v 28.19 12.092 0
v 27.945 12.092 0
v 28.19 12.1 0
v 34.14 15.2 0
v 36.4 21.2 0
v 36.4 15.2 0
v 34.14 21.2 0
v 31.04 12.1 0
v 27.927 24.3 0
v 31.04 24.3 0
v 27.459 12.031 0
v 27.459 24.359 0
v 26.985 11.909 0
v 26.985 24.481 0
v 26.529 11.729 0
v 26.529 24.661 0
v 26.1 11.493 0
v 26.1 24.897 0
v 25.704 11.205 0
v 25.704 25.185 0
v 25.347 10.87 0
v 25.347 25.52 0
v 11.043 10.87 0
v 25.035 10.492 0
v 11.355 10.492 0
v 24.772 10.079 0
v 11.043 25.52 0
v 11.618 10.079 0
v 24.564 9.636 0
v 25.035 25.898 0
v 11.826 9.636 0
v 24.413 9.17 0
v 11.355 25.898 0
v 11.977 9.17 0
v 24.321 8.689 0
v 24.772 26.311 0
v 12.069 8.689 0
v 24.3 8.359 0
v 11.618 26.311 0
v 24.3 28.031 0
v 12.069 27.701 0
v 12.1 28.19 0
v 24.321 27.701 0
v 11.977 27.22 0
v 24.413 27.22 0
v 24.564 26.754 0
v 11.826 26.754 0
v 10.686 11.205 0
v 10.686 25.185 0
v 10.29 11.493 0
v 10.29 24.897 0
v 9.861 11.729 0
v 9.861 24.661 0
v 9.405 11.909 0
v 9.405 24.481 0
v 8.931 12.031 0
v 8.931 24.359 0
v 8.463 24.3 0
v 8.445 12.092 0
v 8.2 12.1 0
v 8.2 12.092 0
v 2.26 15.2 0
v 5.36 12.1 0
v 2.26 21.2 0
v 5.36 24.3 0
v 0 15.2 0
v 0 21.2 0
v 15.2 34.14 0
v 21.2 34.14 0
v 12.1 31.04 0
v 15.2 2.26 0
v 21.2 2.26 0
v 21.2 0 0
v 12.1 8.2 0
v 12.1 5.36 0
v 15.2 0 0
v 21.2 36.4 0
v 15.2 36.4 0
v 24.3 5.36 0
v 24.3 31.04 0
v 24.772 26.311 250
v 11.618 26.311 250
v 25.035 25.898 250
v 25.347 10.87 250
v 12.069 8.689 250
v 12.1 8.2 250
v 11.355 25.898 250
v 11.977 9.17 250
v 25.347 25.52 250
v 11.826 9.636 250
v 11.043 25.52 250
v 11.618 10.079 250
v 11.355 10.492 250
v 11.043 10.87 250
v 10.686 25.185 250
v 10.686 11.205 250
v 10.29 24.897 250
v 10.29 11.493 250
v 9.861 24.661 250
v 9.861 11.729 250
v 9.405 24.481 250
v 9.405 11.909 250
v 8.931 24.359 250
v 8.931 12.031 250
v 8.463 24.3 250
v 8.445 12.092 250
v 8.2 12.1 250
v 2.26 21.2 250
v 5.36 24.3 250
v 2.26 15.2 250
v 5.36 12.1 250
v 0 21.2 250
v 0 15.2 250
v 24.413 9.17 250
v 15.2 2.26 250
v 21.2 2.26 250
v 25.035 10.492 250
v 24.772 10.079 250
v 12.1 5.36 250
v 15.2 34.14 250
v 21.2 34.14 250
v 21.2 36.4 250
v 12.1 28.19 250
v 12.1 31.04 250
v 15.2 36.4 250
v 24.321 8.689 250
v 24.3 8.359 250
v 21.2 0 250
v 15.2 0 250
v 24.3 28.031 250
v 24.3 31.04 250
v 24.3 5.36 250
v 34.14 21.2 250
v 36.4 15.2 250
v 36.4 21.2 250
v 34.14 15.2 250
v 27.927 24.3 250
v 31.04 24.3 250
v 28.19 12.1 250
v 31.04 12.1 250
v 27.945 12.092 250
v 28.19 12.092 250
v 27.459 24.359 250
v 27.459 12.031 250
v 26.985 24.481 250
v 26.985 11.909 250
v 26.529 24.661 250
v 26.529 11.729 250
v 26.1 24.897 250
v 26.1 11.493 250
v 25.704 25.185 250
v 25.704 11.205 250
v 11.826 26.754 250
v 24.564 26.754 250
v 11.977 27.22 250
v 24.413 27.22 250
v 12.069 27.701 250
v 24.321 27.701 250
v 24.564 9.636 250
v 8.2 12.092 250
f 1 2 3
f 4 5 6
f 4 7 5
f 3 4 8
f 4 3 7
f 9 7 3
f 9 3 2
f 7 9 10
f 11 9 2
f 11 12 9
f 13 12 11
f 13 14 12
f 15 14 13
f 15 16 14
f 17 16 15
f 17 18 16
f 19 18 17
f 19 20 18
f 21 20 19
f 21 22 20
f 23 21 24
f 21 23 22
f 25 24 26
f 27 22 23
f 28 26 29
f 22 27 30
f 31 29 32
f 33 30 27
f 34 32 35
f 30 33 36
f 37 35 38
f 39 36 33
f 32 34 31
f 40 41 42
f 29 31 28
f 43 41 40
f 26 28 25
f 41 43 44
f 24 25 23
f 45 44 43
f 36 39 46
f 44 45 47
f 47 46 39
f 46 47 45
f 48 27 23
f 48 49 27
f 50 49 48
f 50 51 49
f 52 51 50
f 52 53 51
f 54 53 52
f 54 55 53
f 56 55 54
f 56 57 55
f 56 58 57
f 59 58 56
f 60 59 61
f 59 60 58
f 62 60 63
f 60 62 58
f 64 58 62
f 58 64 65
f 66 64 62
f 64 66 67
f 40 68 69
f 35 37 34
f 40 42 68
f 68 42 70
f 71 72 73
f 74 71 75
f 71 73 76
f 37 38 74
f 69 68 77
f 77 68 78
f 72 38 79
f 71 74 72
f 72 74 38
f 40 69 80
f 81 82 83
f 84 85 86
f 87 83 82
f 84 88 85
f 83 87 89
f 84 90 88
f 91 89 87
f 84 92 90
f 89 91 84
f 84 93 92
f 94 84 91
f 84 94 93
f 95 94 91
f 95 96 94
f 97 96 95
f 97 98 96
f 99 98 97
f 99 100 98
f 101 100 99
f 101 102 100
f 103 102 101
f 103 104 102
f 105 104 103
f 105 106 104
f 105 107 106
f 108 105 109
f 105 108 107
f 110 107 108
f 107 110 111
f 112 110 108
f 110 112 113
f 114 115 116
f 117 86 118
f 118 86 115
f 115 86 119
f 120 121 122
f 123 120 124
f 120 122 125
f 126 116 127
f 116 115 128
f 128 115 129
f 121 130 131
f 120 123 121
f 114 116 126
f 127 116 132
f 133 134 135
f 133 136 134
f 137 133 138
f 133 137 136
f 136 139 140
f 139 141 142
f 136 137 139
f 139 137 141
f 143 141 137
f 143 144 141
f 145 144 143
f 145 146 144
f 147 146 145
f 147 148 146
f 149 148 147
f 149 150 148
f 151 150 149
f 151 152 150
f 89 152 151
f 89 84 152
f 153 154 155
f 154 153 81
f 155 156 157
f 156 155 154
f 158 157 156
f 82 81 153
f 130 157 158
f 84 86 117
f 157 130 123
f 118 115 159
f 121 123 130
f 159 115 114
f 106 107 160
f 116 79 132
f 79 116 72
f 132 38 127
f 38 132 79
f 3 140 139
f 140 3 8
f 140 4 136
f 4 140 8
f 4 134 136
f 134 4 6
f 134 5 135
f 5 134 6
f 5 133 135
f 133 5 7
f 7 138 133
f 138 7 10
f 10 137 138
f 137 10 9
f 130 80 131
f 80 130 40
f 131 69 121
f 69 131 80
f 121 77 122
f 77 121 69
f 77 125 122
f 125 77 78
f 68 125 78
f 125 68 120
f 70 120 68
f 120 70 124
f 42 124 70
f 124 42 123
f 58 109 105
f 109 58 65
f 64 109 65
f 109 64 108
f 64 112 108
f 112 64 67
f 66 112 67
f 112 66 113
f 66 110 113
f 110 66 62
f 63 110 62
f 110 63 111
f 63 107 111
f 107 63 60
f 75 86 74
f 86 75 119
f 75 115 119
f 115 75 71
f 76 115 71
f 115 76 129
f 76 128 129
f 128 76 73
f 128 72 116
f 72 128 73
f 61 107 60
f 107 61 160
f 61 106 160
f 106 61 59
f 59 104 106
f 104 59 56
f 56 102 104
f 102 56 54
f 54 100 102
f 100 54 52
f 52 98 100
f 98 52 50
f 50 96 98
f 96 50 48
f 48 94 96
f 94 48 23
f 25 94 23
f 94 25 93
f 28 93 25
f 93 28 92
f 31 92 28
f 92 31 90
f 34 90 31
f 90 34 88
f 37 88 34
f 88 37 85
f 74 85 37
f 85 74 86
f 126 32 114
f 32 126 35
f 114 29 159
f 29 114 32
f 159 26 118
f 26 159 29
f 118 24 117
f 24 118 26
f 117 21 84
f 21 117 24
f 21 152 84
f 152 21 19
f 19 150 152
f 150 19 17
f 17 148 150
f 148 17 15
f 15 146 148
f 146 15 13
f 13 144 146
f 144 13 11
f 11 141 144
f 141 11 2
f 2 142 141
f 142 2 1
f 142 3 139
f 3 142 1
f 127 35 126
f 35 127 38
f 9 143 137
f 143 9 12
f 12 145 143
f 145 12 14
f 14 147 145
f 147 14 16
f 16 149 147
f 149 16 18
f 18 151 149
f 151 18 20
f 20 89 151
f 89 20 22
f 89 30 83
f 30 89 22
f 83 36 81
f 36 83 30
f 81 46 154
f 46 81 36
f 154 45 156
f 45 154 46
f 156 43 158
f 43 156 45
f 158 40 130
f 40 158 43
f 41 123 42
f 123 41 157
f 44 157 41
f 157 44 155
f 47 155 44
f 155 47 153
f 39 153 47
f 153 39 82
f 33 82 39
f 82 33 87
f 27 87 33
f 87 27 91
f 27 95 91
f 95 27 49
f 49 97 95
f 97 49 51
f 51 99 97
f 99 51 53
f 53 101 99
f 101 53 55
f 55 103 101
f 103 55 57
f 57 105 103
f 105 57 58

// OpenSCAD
// Generated by SolidPython 1.1.3 on 2022-04-28 23:56:22


union() {
	linear_extrude(center = false, convexity = 10, height = 250, twist = 0) {
		polygon(points = [[15.2000000000, 0.0000000000], [21.2000000000, 0.0000000000], [21.2000000000, 2.2600000000], [24.3000000000, 5.3600000000], [24.3000000000, 12.1000000000], [31.0400000000, 12.1000000000], [34.1400000000, 15.2000000000], [36.4000000000, 15.2000000000], [36.4000000000, 21.2000000000], [34.1400000000, 21.2000000000], [31.0400000000, 24.3000000000], [24.3000000000, 24.3000000000], [24.3000000000, 31.0400000000], [21.2000000000, 34.1400000000], [21.2000000000, 36.4000000000], [15.2000000000, 36.4000000000], [15.2000000000, 34.1400000000], [12.1000000000, 31.0400000000], [12.1000000000, 24.3000000000], [5.3600000000, 24.3000000000], [2.2600000000, 21.2000000000], [0.0000000000, 21.2000000000], [0.0000000000, 15.2000000000], [2.2600000000, 15.2000000000], [5.3600000000, 12.1000000000], [12.1000000000, 12.1000000000], [12.1000000000, 5.3600000000], [15.2000000000, 2.2600000000], [15.2000000000, 0.0000000000]]);
	}
	translate(v = [8.2000000000, 0, 0]) {
		translate(v = [0, 8.2000000000, 0]) {
			linear_extrude(center = false, convexity = 10, height = 250, twist = 0) {
				difference() {
					intersection() {
						rotate(a = 0) {
							translate(v = [-996.1000000000, 0, 0]) {
								square(center = false, size = [1000, 1000]);
							}
						}
						rotate(a = 90) {
							translate(v = [-996.1000000000, -1000, 0]) {
								square(center = false, size = [1000, 1000]);
							}
						}
					}
					circle($fn = 50, r = 3.9000000000);
				}
			}
		}
	}
	translate(v = [28.1900000000, 0, 0]) {
		translate(v = [0, 8.2000000000, 0]) {
			linear_extrude(center = false, convexity = 10, height = 250, twist = 0) {
				difference() {
					intersection() {
						rotate(a = 90) {
							translate(v = [-996.1000000000, 0, 0]) {
								square(center = false, size = [1000, 1000]);
							}
						}
						rotate(a = 180) {
							translate(v = [-996.1000000000, -1000, 0]) {
								square(center = false, size = [1000, 1000]);
							}
						}
					}
					circle($fn = 50, r = 3.9000000000);
				}
			}
		}
	}
	translate(v = [28.1900000000, 0, 0]) {
		translate(v = [0, 28.1900000000, 0]) {
			linear_extrude(center = false, convexity = 10, height = 250, twist = 0) {
				difference() {
					intersection() {
						rotate(a = 180) {
							translate(v = [-996.1000000000, 0, 0]) {
								square(center = false, size = [1000, 1000]);
							}
						}
						rotate(a = 270) {
							translate(v = [-996.1000000000, -1000, 0]) {
								square(center = false, size = [1000, 1000]);
							}
						}
					}
					circle($fn = 50, r = 3.9000000000);
				}
			}
		}
	}
	translate(v = [8.2000000000, 0, 0]) {
		translate(v = [0, 28.1900000000, 0]) {
			linear_extrude(center = false, convexity = 10, height = 250, twist = 0) {
				difference() {
					intersection() {
						rotate(a = 270) {
							translate(v = [-996.1000000000, 0, 0]) {
								square(center = false, size = [1000, 1000]);
							}
						}
						rotate(a = 360) {
							translate(v = [-996.1000000000, -1000, 0]) {
								square(center = false, size = [1000, 1000]);
							}
						}
					}
					circle($fn = 50, r = 3.9000000000);
				}
			}
		}
	}
}
/***********************************************
*********      SolidPython code:      **********
************************************************
 
from solid import *
from solid.utils import *  # Not required, but the utils module is useful
from vslot2020 import *

def center_hole_4040(height):
    points = [
        [15.2, 0.0, 0.0],
        [21.2, 0.0, 0.0],
        [21.2, 2.26, 0.0],
        [24.3, 5.36, 0.0],
        [24.3, 12.1, 0.0],
        [31.04, 12.1, 0.0],
        [34.14, 15.2, 0.0],
        [36.4, 15.2, 0.0],
        [36.4, 21.2, 0.0],
        [34.14, 21.2, 0.0],
        [31.04, 24.3, 0.0],
        [24.3, 24.3, 0.0],
        [24.3, 31.04, 0.0],
        [21.2, 34.14, 0.0],
        [21.2, 36.4, 0.0],
        [15.2, 36.4, 0.0],
        [15.2, 34.14, 0.0],
        [12.1, 31.04, 0.0],
        [12.1, 24.3, 0.0],
        [5.36, 24.3, 0.0],
        [2.26, 21.2, 0.0],
        [0.0, 21.2, 0.0],
        [0.0, 15.2, 0.0],
        [2.26, 15.2, 0.0],
        [5.36, 12.1, 0.0],
        [12.1, 12.1, 0.0],
        [12.1, 5.36, 0.0],
        [15.2, 2.26, 0.0],
        [15.2, 0.0, 0.0]
    ];

    solid = linear_extrude(height = height, center = False, convexity = 10, twist = 0)(
        polygon(points)
    );

    solid += right(8.2)(
        forward(8.2)(
            linear_extrude(height=height, center=False, convexity=10, twist=0)(
                arc_inverted(rad=3.9, start_degrees=0, end_degrees=90, segments=50)
            )
        )
    );

    solid += right(28.19)(
        forward(8.2)(
            linear_extrude(height=height, center=False, convexity=10, twist=0)(
                arc_inverted(rad=3.9, start_degrees=90, end_degrees=180, segments=50)
            )
        )
    );

    solid += right(28.19)(
        forward(28.19)(
            linear_extrude(height=height, center=False, convexity=10, twist=0)(
                arc_inverted(rad=3.9, start_degrees=180, end_degrees=270, segments=50)
            )
        )
    );

    solid += right(8.2)(
        forward(28.19)(
            linear_extrude(height=height, center=False, convexity=10, twist=0)(
                arc_inverted(rad=3.9, start_degrees=270, end_degrees=360, segments=50)
            )
        )
    );

    return solid;


def make_4040(height):
    extrusion = make_2020(height);
    extrusion += right(20)(
        make_2020(height)
    );
    extrusion += forward(20)(
        make_2020(height)
    );
    extrusion += forward(20)(
        right(20)(
            make_2020(height)
        )
    );

    extrusion -= forward(1.8)(
        right(1.8)(
            center_hole_4040(height)
        )
    );

    return extrusion;

# Render
scad_render_to_file(make_4040(100), '../../scad/vslot4040_250mm.scad');
scad_render_to_file(make_4040(100), '../../scad/vslot4040_500mm.scad');
scad_render_to_file(make_4040(100), '../../scad/vslot4040_1000mm.scad');
scad_render_to_file(make_4040(100), '../../scad/vslot4040_1500mm.scad');
scad_render_to_file(make_4040(100), '../../scad/vslot4040_2000mm.scad');
scad_render_to_file(center_hole_4040(250), '../../scad/vslot4040hole.scad'); 
 
************************************************/
